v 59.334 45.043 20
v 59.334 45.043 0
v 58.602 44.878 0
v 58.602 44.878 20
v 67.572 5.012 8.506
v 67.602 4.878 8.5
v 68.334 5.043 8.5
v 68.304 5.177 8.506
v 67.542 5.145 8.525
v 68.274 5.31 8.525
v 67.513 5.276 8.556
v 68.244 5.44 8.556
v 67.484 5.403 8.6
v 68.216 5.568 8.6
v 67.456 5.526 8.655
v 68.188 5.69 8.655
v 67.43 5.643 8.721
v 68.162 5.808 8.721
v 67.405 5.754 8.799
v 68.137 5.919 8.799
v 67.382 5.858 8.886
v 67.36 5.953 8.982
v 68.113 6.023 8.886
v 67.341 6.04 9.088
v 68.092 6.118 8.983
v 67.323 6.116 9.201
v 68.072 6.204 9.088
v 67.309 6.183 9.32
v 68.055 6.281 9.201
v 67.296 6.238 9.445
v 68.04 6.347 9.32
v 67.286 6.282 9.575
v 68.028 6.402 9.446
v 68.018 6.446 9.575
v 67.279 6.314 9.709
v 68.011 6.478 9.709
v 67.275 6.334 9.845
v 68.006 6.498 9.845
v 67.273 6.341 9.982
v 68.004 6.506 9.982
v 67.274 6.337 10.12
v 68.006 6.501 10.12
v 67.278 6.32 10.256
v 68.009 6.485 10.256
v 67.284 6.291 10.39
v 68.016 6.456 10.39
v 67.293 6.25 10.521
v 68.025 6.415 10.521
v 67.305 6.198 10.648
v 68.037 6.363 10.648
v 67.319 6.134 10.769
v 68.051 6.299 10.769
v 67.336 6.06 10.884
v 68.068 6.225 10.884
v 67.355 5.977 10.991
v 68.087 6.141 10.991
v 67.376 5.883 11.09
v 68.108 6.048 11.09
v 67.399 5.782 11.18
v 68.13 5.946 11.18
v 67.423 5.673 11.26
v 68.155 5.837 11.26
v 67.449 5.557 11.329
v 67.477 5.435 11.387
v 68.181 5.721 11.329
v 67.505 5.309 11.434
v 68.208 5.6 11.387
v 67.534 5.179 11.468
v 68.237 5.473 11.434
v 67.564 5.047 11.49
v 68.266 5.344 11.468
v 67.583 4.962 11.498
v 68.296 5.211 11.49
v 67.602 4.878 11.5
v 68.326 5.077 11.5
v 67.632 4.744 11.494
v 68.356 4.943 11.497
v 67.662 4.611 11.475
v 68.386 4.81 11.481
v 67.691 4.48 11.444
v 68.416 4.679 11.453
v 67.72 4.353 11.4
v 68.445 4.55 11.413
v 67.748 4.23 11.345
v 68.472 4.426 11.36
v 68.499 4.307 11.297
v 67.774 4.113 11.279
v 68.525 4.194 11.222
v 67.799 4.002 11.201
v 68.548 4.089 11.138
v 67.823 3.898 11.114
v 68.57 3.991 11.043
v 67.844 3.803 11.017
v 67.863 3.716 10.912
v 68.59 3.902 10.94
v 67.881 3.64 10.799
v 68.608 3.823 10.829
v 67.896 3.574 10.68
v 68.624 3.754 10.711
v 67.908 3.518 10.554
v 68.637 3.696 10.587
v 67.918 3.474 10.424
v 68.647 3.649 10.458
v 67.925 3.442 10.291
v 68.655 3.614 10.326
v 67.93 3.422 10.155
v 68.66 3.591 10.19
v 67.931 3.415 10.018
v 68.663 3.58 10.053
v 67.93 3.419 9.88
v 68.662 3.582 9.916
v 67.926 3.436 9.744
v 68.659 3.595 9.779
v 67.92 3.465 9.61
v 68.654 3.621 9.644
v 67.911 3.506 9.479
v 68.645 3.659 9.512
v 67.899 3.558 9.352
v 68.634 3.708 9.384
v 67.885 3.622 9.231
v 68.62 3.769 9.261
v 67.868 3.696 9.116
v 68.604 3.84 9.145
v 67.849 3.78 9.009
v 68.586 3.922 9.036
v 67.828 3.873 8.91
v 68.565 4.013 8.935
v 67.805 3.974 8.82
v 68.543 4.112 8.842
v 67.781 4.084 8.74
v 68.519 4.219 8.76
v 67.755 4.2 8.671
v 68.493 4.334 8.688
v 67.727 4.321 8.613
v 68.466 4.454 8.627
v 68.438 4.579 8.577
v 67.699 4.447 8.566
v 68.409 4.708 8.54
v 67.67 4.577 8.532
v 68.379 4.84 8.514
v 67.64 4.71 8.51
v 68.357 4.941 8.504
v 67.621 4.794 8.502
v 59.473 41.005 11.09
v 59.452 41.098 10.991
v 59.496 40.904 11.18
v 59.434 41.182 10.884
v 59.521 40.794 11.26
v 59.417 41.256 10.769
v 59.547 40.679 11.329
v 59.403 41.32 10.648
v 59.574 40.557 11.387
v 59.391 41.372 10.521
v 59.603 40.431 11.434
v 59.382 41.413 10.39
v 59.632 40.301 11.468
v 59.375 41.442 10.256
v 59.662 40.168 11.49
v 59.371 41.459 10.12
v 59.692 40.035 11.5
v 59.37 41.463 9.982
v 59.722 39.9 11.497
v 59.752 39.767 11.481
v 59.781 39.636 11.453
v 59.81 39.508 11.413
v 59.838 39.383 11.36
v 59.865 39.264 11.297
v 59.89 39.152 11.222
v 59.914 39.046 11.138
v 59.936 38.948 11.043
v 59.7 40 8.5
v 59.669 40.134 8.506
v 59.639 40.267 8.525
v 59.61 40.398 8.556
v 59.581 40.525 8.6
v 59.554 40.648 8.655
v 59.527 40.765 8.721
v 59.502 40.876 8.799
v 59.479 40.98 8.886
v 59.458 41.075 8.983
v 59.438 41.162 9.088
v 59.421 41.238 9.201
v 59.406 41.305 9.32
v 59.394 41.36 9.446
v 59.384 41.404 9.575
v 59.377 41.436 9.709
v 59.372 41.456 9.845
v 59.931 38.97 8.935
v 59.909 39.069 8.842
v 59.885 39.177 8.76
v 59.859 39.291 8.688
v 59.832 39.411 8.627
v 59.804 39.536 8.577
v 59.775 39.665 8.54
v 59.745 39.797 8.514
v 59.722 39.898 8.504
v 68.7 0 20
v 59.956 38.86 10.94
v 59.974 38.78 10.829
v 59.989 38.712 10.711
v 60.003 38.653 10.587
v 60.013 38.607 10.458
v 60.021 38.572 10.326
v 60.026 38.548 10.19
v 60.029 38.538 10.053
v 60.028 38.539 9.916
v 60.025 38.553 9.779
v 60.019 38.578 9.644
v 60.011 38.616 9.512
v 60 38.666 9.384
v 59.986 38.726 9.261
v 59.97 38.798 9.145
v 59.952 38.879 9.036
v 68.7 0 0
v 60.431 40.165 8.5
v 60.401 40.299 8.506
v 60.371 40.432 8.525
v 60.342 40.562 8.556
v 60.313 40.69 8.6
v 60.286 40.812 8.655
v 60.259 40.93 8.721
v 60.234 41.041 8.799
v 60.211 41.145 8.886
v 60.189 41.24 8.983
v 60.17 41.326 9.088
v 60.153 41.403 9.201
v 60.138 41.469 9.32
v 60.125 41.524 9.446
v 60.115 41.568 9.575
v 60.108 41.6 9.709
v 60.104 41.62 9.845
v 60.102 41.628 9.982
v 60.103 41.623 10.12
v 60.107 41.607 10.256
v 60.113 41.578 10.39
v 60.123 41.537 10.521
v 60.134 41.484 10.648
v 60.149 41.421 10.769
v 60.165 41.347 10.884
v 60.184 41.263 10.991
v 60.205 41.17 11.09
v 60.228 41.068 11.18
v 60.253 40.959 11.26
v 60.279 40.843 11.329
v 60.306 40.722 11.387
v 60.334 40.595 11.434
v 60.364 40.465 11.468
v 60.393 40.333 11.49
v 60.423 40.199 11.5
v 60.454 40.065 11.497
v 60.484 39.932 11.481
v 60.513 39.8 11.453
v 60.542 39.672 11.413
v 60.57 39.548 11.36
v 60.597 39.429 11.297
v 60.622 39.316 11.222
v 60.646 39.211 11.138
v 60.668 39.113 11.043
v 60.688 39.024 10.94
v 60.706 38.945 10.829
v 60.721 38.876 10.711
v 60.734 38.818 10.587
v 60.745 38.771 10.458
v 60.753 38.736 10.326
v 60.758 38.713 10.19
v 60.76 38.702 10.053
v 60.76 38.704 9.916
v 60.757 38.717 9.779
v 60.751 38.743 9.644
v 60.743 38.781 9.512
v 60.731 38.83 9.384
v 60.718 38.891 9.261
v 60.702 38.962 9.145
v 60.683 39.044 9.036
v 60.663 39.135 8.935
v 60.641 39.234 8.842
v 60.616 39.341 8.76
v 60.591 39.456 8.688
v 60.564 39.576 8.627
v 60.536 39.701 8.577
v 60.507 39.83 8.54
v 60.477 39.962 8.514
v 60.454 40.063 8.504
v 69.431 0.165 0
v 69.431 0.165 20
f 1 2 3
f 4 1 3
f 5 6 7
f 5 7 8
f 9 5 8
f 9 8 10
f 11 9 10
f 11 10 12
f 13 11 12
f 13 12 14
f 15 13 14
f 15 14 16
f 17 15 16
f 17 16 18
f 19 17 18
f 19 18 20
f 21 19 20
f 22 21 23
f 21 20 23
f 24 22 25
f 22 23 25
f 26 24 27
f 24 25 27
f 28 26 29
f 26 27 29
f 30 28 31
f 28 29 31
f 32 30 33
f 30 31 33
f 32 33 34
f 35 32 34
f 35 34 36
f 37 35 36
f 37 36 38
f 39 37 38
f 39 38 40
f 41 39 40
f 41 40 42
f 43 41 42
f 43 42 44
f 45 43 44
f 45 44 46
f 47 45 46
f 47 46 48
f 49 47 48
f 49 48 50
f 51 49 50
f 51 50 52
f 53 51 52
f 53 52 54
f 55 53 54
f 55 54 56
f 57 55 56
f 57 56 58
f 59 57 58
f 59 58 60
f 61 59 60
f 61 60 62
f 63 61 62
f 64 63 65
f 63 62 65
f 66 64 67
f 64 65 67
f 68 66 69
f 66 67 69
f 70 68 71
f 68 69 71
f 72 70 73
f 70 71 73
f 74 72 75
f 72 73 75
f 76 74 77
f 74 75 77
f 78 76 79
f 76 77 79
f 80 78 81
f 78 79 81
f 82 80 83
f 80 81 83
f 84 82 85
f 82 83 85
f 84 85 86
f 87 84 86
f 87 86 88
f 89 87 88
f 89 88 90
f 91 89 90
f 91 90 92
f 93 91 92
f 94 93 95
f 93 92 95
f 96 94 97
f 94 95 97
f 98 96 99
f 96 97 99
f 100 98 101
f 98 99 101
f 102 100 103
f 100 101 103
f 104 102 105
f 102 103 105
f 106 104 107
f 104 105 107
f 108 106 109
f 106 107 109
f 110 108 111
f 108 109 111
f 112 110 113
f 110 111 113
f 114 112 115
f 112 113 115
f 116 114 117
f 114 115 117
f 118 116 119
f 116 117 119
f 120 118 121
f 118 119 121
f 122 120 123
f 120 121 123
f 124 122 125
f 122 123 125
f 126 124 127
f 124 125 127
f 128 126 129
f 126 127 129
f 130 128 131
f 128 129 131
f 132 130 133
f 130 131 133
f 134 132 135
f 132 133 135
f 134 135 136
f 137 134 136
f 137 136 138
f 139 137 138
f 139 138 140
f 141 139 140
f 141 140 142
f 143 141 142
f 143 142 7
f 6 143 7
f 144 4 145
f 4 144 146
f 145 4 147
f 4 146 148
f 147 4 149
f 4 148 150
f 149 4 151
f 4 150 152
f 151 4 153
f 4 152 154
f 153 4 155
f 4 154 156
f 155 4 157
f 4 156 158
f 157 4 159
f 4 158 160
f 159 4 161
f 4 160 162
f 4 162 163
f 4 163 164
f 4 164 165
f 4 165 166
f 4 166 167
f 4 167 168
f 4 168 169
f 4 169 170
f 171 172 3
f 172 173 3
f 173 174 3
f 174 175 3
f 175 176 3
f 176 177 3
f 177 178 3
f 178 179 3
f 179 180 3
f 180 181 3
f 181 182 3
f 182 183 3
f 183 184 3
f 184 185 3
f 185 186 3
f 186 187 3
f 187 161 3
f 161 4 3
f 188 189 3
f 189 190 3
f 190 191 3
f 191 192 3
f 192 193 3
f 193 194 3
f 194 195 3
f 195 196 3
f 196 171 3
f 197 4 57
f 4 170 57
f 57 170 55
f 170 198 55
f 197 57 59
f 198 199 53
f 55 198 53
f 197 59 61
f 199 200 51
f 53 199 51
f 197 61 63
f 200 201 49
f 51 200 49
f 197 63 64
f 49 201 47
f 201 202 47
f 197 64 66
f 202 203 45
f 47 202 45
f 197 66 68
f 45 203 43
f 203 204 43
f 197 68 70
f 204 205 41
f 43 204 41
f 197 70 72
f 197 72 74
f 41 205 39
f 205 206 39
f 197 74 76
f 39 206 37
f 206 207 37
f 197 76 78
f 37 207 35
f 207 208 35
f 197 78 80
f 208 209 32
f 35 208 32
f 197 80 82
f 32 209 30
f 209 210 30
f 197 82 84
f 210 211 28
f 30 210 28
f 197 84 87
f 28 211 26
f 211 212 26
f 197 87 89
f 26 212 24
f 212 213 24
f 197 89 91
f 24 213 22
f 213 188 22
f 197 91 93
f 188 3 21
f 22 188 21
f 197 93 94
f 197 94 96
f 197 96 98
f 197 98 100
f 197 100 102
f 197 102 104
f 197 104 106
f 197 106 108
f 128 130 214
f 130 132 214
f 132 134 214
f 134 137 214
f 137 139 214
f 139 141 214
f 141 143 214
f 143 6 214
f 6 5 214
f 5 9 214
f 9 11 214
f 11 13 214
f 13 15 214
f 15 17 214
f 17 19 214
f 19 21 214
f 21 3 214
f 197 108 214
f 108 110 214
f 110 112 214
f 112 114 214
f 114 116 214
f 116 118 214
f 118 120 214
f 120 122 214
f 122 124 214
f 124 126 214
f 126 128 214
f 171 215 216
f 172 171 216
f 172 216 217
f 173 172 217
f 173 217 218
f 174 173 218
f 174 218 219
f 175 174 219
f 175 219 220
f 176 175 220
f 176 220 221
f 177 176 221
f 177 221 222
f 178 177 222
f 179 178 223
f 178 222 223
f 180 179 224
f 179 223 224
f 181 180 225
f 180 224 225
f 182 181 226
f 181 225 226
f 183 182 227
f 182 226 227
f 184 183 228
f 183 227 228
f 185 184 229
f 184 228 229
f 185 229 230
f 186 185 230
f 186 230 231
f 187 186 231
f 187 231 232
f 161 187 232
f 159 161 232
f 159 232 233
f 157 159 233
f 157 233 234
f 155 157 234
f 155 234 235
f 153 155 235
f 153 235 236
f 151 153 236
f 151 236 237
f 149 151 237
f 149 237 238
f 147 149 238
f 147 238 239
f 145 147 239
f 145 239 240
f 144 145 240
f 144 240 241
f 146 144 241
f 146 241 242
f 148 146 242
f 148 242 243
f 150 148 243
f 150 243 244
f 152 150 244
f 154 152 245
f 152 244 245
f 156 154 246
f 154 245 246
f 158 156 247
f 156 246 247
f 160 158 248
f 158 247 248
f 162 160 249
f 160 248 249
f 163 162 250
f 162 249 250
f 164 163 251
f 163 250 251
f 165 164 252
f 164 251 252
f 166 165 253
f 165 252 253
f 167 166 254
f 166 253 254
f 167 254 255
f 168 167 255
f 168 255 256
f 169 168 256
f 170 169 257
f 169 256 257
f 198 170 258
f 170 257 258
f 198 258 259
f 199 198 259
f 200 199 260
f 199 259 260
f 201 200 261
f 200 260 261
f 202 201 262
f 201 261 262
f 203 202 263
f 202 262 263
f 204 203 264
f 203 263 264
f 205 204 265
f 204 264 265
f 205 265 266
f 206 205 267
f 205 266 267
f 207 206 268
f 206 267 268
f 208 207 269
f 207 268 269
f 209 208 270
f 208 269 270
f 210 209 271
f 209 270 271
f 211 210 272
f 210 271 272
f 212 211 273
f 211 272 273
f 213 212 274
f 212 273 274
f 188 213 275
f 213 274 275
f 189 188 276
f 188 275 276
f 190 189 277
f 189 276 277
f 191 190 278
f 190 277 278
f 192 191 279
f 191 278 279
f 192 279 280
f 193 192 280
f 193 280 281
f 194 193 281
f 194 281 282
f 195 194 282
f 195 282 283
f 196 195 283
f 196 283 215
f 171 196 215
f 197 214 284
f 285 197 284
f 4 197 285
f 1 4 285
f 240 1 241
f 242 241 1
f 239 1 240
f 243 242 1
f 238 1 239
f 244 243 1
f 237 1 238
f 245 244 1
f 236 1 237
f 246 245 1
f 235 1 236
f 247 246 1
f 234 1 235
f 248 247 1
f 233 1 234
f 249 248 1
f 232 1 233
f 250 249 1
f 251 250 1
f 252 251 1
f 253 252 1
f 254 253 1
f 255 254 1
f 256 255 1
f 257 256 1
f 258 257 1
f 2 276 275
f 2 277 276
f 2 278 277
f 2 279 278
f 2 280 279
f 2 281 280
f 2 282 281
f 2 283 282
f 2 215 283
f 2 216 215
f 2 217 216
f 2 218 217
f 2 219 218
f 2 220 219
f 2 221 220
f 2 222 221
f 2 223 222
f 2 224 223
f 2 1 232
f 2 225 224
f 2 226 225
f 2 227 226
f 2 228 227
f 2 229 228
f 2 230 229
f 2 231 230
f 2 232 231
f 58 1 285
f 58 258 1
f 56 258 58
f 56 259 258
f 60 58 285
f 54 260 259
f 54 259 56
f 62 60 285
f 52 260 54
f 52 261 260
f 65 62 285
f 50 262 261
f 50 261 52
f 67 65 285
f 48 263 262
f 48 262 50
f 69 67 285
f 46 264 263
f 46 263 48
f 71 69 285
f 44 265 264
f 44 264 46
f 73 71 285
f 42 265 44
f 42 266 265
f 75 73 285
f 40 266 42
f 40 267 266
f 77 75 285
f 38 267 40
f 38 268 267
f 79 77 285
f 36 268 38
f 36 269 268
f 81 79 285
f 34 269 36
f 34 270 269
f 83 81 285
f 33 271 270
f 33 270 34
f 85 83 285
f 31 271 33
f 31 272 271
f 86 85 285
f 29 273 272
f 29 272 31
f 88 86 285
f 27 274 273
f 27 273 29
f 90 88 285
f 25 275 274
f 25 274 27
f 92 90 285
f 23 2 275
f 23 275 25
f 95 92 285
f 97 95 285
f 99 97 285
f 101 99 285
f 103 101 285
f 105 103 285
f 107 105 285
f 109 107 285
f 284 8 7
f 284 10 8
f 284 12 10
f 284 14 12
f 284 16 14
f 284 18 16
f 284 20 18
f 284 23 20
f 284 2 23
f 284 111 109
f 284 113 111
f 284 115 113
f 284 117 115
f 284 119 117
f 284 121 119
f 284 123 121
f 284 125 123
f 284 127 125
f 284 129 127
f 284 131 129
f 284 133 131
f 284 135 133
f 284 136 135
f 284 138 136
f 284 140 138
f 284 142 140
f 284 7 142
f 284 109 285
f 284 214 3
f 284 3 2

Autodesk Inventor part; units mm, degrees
ref_plane "YZ Plane" through (0, 0, 0) normal (1, 0, 0) x (0, 1, 0)
ref_plane "XZ Plane" through (0, 0, 0) normal (0, 1, 0) x (-1, 0, 0)
ref_plane "XY Plane" through (0, 0, 0) normal (0, 0, 1) x (1, 0, 0)
sketch "スケッチ1" plane through (0, 0, 0) normal (0, 0, 1) x (1, 0, 0)
  circle A0 centre (54.6996, 44) radius 4
  line L0 (61.9927, 0) -> (64.9927, 0)
  line L1 (58.602, 44.878) -> (68.6996, 0)
  line L2 (64.9927, 0) -> (67.602, 4.878)
  line L3 (59.3337, 45.0427) -> (69.4313, 0.1646)
  line L4 (59.3337, 45.0427) -> (58.602, 44.878)
  line L5 (68.6996, 0) -> (69.4313, 0.1646)
  point P0 (0, 0)
  dimension "d0" = 5
  dimension "d1" = 0.75
  dimension "d12" = 77.32
extrude "押し出し1" add sketch "スケッチ1" along normal blind 20 contours L4 L3 L5 L1
sketch "スケッチ2" plane through (59.3337, 45.0427, 20) normal (0.9756, 0.2195, 0) x (0, 0, -1)
  line L0 (20, -46) -> (20, 0) projected
  line L1 (20, 0) -> (0, 0) projected
  line L2 (0, -46) -> (0, 0) projected
  line L3 (20, -46) -> (0, -46) projected
  circle A0 centre (10, -41) radius 1.5
  circle A1 centre (10, -5) radius 1.5
  point P0 (20, -30.9196)
  dimension "d4" = 3
  dimension "d5" = 5
  dimension "d6" = 10
  dimension "d7" = 3
  dimension "d8" = 5
  dimension "d9" = 10
extrude "押し出し2" cut sketch "スケッチ2" against normal blind 0.75 contours A0 | A1
properties part number "アームガード" material "ポリプロピレン"
